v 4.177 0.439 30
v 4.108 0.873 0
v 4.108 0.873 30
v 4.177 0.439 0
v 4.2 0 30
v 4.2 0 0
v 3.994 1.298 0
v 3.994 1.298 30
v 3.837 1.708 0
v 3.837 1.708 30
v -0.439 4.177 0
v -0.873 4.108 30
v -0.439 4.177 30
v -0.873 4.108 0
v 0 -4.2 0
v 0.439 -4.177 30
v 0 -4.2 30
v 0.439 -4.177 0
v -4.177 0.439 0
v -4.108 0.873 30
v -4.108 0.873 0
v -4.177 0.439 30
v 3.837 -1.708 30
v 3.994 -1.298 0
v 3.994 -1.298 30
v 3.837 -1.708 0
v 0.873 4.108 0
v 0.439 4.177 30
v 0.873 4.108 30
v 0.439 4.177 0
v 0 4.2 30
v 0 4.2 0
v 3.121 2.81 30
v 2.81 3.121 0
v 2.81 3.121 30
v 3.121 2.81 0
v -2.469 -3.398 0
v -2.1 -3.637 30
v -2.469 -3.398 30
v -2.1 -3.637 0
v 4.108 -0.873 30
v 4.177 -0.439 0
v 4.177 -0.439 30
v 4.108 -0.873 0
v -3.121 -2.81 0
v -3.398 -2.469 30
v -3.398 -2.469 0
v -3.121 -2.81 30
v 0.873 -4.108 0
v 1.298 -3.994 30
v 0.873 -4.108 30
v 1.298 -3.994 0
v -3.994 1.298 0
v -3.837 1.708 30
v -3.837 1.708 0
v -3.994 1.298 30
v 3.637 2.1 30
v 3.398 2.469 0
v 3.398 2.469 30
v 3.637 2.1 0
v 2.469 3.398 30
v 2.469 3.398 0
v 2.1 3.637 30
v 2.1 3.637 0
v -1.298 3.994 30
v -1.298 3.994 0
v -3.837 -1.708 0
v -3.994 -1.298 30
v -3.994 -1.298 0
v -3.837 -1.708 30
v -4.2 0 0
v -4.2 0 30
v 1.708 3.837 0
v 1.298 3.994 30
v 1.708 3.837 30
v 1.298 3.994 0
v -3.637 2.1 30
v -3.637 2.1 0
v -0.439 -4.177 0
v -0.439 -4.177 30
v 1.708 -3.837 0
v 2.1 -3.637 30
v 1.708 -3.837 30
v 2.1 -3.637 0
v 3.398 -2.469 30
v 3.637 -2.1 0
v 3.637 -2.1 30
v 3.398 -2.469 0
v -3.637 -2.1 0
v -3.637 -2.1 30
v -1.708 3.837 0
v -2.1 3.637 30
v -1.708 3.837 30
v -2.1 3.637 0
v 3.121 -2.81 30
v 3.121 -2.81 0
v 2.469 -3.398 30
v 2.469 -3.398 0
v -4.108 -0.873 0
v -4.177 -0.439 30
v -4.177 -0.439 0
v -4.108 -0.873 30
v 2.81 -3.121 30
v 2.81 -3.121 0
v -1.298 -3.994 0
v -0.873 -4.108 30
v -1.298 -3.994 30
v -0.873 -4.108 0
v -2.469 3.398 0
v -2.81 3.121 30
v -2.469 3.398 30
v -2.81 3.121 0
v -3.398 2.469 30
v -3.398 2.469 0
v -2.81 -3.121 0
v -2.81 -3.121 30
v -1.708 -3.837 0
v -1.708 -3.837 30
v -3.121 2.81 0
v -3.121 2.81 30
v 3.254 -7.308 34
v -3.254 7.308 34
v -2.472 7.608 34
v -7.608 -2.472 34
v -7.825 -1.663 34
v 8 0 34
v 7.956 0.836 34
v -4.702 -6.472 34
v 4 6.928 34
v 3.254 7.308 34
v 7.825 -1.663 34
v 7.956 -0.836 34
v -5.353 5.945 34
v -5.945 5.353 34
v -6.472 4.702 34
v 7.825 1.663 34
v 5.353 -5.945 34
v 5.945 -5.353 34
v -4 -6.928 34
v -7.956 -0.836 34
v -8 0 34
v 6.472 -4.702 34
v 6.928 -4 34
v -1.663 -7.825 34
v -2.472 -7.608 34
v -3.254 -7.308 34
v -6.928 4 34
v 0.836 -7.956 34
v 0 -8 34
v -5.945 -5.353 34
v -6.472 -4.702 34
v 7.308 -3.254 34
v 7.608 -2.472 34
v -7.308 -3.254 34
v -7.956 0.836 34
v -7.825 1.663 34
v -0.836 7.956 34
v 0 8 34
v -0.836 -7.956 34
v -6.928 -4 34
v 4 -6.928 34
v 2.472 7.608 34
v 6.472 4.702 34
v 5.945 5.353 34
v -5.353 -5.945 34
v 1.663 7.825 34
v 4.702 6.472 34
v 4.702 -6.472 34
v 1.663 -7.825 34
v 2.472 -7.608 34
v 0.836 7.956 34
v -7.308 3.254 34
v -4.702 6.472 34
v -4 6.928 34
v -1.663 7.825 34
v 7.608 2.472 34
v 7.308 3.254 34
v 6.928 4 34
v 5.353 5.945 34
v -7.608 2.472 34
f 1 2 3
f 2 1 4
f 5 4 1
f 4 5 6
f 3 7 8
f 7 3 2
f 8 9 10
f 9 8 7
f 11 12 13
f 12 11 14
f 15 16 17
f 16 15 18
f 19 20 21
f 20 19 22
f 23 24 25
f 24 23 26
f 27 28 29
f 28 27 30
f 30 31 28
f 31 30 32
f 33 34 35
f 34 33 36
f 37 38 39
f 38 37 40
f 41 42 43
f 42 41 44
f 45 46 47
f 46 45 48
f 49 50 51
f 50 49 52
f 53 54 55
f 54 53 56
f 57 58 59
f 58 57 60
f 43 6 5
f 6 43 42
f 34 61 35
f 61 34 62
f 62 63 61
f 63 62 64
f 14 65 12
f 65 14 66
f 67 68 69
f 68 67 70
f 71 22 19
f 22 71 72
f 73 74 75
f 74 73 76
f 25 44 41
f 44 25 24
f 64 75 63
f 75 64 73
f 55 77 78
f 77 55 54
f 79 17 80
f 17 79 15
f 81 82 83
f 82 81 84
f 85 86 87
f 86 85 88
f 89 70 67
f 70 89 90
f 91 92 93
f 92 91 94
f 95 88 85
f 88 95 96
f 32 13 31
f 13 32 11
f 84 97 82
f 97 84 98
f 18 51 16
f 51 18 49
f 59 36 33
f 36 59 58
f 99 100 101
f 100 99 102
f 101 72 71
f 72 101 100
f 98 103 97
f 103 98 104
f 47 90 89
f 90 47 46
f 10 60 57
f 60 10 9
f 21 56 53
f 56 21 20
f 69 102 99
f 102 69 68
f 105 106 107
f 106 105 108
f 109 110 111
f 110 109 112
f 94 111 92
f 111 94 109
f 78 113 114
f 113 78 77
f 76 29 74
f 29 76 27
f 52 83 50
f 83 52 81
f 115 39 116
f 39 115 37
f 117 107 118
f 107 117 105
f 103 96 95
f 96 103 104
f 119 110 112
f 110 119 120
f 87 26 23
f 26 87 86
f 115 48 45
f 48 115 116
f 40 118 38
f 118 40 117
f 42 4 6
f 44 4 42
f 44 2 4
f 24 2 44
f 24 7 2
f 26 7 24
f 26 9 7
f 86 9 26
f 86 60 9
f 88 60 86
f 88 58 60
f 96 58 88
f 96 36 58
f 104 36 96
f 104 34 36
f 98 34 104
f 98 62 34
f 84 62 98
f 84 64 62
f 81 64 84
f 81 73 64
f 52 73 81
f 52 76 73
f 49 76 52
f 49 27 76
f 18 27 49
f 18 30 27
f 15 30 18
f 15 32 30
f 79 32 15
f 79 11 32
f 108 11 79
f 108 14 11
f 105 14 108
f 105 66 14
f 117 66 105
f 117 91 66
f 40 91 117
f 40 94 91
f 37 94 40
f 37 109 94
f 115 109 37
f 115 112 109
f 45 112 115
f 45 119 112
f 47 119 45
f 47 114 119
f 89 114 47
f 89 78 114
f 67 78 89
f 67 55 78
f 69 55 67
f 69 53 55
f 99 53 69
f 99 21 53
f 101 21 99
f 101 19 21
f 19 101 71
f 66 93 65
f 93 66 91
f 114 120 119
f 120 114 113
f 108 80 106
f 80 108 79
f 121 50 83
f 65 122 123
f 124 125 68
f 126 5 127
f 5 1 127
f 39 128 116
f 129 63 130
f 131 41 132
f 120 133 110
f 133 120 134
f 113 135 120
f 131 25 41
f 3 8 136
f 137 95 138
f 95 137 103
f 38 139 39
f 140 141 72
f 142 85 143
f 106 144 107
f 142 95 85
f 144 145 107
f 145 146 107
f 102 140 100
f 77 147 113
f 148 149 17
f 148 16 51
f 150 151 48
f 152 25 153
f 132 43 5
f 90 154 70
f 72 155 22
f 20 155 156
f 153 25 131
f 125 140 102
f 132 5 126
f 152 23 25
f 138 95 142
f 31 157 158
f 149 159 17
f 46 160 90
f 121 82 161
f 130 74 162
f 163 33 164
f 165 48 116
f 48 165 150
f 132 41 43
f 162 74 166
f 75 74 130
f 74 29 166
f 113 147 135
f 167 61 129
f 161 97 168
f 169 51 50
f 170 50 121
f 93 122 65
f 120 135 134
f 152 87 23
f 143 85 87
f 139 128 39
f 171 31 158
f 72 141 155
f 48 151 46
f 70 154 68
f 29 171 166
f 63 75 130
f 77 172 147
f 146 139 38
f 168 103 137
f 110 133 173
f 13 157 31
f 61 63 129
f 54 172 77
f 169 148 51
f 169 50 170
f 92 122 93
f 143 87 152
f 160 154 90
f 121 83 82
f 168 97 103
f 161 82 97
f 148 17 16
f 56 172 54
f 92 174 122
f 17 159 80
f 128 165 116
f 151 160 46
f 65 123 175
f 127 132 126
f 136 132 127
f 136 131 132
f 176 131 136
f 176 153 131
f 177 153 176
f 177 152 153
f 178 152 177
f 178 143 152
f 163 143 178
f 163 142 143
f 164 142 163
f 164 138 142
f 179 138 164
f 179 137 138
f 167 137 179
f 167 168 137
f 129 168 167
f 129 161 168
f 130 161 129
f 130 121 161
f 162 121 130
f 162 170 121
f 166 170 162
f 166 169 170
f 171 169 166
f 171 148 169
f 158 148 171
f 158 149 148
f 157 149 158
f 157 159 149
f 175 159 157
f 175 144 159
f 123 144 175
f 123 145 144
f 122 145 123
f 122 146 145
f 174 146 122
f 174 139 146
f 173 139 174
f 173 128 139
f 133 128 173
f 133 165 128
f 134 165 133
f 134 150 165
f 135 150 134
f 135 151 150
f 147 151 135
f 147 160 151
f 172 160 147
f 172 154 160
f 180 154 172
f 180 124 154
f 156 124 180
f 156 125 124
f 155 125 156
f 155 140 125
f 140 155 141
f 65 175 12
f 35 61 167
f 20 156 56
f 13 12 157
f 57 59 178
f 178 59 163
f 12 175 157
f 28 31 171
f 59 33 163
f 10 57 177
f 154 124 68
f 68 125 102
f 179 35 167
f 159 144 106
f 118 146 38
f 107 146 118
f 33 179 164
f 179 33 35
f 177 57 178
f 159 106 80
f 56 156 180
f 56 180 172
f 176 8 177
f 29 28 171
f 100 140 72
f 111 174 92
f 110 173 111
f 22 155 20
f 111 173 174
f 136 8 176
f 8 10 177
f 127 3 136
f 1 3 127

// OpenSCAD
// Countersunk screw with 90-degree conical head.
$fn = 60;
eps = 0.02;
shaft_d = 8.4;
head_d = 16;
head_h = 4;
shaft_l = 30;
union() {
    cylinder(d = shaft_d, h = shaft_l);
    translate([0, 0, shaft_l]) cylinder(d1 = shaft_d, d2 = head_d, h = head_h);
}
